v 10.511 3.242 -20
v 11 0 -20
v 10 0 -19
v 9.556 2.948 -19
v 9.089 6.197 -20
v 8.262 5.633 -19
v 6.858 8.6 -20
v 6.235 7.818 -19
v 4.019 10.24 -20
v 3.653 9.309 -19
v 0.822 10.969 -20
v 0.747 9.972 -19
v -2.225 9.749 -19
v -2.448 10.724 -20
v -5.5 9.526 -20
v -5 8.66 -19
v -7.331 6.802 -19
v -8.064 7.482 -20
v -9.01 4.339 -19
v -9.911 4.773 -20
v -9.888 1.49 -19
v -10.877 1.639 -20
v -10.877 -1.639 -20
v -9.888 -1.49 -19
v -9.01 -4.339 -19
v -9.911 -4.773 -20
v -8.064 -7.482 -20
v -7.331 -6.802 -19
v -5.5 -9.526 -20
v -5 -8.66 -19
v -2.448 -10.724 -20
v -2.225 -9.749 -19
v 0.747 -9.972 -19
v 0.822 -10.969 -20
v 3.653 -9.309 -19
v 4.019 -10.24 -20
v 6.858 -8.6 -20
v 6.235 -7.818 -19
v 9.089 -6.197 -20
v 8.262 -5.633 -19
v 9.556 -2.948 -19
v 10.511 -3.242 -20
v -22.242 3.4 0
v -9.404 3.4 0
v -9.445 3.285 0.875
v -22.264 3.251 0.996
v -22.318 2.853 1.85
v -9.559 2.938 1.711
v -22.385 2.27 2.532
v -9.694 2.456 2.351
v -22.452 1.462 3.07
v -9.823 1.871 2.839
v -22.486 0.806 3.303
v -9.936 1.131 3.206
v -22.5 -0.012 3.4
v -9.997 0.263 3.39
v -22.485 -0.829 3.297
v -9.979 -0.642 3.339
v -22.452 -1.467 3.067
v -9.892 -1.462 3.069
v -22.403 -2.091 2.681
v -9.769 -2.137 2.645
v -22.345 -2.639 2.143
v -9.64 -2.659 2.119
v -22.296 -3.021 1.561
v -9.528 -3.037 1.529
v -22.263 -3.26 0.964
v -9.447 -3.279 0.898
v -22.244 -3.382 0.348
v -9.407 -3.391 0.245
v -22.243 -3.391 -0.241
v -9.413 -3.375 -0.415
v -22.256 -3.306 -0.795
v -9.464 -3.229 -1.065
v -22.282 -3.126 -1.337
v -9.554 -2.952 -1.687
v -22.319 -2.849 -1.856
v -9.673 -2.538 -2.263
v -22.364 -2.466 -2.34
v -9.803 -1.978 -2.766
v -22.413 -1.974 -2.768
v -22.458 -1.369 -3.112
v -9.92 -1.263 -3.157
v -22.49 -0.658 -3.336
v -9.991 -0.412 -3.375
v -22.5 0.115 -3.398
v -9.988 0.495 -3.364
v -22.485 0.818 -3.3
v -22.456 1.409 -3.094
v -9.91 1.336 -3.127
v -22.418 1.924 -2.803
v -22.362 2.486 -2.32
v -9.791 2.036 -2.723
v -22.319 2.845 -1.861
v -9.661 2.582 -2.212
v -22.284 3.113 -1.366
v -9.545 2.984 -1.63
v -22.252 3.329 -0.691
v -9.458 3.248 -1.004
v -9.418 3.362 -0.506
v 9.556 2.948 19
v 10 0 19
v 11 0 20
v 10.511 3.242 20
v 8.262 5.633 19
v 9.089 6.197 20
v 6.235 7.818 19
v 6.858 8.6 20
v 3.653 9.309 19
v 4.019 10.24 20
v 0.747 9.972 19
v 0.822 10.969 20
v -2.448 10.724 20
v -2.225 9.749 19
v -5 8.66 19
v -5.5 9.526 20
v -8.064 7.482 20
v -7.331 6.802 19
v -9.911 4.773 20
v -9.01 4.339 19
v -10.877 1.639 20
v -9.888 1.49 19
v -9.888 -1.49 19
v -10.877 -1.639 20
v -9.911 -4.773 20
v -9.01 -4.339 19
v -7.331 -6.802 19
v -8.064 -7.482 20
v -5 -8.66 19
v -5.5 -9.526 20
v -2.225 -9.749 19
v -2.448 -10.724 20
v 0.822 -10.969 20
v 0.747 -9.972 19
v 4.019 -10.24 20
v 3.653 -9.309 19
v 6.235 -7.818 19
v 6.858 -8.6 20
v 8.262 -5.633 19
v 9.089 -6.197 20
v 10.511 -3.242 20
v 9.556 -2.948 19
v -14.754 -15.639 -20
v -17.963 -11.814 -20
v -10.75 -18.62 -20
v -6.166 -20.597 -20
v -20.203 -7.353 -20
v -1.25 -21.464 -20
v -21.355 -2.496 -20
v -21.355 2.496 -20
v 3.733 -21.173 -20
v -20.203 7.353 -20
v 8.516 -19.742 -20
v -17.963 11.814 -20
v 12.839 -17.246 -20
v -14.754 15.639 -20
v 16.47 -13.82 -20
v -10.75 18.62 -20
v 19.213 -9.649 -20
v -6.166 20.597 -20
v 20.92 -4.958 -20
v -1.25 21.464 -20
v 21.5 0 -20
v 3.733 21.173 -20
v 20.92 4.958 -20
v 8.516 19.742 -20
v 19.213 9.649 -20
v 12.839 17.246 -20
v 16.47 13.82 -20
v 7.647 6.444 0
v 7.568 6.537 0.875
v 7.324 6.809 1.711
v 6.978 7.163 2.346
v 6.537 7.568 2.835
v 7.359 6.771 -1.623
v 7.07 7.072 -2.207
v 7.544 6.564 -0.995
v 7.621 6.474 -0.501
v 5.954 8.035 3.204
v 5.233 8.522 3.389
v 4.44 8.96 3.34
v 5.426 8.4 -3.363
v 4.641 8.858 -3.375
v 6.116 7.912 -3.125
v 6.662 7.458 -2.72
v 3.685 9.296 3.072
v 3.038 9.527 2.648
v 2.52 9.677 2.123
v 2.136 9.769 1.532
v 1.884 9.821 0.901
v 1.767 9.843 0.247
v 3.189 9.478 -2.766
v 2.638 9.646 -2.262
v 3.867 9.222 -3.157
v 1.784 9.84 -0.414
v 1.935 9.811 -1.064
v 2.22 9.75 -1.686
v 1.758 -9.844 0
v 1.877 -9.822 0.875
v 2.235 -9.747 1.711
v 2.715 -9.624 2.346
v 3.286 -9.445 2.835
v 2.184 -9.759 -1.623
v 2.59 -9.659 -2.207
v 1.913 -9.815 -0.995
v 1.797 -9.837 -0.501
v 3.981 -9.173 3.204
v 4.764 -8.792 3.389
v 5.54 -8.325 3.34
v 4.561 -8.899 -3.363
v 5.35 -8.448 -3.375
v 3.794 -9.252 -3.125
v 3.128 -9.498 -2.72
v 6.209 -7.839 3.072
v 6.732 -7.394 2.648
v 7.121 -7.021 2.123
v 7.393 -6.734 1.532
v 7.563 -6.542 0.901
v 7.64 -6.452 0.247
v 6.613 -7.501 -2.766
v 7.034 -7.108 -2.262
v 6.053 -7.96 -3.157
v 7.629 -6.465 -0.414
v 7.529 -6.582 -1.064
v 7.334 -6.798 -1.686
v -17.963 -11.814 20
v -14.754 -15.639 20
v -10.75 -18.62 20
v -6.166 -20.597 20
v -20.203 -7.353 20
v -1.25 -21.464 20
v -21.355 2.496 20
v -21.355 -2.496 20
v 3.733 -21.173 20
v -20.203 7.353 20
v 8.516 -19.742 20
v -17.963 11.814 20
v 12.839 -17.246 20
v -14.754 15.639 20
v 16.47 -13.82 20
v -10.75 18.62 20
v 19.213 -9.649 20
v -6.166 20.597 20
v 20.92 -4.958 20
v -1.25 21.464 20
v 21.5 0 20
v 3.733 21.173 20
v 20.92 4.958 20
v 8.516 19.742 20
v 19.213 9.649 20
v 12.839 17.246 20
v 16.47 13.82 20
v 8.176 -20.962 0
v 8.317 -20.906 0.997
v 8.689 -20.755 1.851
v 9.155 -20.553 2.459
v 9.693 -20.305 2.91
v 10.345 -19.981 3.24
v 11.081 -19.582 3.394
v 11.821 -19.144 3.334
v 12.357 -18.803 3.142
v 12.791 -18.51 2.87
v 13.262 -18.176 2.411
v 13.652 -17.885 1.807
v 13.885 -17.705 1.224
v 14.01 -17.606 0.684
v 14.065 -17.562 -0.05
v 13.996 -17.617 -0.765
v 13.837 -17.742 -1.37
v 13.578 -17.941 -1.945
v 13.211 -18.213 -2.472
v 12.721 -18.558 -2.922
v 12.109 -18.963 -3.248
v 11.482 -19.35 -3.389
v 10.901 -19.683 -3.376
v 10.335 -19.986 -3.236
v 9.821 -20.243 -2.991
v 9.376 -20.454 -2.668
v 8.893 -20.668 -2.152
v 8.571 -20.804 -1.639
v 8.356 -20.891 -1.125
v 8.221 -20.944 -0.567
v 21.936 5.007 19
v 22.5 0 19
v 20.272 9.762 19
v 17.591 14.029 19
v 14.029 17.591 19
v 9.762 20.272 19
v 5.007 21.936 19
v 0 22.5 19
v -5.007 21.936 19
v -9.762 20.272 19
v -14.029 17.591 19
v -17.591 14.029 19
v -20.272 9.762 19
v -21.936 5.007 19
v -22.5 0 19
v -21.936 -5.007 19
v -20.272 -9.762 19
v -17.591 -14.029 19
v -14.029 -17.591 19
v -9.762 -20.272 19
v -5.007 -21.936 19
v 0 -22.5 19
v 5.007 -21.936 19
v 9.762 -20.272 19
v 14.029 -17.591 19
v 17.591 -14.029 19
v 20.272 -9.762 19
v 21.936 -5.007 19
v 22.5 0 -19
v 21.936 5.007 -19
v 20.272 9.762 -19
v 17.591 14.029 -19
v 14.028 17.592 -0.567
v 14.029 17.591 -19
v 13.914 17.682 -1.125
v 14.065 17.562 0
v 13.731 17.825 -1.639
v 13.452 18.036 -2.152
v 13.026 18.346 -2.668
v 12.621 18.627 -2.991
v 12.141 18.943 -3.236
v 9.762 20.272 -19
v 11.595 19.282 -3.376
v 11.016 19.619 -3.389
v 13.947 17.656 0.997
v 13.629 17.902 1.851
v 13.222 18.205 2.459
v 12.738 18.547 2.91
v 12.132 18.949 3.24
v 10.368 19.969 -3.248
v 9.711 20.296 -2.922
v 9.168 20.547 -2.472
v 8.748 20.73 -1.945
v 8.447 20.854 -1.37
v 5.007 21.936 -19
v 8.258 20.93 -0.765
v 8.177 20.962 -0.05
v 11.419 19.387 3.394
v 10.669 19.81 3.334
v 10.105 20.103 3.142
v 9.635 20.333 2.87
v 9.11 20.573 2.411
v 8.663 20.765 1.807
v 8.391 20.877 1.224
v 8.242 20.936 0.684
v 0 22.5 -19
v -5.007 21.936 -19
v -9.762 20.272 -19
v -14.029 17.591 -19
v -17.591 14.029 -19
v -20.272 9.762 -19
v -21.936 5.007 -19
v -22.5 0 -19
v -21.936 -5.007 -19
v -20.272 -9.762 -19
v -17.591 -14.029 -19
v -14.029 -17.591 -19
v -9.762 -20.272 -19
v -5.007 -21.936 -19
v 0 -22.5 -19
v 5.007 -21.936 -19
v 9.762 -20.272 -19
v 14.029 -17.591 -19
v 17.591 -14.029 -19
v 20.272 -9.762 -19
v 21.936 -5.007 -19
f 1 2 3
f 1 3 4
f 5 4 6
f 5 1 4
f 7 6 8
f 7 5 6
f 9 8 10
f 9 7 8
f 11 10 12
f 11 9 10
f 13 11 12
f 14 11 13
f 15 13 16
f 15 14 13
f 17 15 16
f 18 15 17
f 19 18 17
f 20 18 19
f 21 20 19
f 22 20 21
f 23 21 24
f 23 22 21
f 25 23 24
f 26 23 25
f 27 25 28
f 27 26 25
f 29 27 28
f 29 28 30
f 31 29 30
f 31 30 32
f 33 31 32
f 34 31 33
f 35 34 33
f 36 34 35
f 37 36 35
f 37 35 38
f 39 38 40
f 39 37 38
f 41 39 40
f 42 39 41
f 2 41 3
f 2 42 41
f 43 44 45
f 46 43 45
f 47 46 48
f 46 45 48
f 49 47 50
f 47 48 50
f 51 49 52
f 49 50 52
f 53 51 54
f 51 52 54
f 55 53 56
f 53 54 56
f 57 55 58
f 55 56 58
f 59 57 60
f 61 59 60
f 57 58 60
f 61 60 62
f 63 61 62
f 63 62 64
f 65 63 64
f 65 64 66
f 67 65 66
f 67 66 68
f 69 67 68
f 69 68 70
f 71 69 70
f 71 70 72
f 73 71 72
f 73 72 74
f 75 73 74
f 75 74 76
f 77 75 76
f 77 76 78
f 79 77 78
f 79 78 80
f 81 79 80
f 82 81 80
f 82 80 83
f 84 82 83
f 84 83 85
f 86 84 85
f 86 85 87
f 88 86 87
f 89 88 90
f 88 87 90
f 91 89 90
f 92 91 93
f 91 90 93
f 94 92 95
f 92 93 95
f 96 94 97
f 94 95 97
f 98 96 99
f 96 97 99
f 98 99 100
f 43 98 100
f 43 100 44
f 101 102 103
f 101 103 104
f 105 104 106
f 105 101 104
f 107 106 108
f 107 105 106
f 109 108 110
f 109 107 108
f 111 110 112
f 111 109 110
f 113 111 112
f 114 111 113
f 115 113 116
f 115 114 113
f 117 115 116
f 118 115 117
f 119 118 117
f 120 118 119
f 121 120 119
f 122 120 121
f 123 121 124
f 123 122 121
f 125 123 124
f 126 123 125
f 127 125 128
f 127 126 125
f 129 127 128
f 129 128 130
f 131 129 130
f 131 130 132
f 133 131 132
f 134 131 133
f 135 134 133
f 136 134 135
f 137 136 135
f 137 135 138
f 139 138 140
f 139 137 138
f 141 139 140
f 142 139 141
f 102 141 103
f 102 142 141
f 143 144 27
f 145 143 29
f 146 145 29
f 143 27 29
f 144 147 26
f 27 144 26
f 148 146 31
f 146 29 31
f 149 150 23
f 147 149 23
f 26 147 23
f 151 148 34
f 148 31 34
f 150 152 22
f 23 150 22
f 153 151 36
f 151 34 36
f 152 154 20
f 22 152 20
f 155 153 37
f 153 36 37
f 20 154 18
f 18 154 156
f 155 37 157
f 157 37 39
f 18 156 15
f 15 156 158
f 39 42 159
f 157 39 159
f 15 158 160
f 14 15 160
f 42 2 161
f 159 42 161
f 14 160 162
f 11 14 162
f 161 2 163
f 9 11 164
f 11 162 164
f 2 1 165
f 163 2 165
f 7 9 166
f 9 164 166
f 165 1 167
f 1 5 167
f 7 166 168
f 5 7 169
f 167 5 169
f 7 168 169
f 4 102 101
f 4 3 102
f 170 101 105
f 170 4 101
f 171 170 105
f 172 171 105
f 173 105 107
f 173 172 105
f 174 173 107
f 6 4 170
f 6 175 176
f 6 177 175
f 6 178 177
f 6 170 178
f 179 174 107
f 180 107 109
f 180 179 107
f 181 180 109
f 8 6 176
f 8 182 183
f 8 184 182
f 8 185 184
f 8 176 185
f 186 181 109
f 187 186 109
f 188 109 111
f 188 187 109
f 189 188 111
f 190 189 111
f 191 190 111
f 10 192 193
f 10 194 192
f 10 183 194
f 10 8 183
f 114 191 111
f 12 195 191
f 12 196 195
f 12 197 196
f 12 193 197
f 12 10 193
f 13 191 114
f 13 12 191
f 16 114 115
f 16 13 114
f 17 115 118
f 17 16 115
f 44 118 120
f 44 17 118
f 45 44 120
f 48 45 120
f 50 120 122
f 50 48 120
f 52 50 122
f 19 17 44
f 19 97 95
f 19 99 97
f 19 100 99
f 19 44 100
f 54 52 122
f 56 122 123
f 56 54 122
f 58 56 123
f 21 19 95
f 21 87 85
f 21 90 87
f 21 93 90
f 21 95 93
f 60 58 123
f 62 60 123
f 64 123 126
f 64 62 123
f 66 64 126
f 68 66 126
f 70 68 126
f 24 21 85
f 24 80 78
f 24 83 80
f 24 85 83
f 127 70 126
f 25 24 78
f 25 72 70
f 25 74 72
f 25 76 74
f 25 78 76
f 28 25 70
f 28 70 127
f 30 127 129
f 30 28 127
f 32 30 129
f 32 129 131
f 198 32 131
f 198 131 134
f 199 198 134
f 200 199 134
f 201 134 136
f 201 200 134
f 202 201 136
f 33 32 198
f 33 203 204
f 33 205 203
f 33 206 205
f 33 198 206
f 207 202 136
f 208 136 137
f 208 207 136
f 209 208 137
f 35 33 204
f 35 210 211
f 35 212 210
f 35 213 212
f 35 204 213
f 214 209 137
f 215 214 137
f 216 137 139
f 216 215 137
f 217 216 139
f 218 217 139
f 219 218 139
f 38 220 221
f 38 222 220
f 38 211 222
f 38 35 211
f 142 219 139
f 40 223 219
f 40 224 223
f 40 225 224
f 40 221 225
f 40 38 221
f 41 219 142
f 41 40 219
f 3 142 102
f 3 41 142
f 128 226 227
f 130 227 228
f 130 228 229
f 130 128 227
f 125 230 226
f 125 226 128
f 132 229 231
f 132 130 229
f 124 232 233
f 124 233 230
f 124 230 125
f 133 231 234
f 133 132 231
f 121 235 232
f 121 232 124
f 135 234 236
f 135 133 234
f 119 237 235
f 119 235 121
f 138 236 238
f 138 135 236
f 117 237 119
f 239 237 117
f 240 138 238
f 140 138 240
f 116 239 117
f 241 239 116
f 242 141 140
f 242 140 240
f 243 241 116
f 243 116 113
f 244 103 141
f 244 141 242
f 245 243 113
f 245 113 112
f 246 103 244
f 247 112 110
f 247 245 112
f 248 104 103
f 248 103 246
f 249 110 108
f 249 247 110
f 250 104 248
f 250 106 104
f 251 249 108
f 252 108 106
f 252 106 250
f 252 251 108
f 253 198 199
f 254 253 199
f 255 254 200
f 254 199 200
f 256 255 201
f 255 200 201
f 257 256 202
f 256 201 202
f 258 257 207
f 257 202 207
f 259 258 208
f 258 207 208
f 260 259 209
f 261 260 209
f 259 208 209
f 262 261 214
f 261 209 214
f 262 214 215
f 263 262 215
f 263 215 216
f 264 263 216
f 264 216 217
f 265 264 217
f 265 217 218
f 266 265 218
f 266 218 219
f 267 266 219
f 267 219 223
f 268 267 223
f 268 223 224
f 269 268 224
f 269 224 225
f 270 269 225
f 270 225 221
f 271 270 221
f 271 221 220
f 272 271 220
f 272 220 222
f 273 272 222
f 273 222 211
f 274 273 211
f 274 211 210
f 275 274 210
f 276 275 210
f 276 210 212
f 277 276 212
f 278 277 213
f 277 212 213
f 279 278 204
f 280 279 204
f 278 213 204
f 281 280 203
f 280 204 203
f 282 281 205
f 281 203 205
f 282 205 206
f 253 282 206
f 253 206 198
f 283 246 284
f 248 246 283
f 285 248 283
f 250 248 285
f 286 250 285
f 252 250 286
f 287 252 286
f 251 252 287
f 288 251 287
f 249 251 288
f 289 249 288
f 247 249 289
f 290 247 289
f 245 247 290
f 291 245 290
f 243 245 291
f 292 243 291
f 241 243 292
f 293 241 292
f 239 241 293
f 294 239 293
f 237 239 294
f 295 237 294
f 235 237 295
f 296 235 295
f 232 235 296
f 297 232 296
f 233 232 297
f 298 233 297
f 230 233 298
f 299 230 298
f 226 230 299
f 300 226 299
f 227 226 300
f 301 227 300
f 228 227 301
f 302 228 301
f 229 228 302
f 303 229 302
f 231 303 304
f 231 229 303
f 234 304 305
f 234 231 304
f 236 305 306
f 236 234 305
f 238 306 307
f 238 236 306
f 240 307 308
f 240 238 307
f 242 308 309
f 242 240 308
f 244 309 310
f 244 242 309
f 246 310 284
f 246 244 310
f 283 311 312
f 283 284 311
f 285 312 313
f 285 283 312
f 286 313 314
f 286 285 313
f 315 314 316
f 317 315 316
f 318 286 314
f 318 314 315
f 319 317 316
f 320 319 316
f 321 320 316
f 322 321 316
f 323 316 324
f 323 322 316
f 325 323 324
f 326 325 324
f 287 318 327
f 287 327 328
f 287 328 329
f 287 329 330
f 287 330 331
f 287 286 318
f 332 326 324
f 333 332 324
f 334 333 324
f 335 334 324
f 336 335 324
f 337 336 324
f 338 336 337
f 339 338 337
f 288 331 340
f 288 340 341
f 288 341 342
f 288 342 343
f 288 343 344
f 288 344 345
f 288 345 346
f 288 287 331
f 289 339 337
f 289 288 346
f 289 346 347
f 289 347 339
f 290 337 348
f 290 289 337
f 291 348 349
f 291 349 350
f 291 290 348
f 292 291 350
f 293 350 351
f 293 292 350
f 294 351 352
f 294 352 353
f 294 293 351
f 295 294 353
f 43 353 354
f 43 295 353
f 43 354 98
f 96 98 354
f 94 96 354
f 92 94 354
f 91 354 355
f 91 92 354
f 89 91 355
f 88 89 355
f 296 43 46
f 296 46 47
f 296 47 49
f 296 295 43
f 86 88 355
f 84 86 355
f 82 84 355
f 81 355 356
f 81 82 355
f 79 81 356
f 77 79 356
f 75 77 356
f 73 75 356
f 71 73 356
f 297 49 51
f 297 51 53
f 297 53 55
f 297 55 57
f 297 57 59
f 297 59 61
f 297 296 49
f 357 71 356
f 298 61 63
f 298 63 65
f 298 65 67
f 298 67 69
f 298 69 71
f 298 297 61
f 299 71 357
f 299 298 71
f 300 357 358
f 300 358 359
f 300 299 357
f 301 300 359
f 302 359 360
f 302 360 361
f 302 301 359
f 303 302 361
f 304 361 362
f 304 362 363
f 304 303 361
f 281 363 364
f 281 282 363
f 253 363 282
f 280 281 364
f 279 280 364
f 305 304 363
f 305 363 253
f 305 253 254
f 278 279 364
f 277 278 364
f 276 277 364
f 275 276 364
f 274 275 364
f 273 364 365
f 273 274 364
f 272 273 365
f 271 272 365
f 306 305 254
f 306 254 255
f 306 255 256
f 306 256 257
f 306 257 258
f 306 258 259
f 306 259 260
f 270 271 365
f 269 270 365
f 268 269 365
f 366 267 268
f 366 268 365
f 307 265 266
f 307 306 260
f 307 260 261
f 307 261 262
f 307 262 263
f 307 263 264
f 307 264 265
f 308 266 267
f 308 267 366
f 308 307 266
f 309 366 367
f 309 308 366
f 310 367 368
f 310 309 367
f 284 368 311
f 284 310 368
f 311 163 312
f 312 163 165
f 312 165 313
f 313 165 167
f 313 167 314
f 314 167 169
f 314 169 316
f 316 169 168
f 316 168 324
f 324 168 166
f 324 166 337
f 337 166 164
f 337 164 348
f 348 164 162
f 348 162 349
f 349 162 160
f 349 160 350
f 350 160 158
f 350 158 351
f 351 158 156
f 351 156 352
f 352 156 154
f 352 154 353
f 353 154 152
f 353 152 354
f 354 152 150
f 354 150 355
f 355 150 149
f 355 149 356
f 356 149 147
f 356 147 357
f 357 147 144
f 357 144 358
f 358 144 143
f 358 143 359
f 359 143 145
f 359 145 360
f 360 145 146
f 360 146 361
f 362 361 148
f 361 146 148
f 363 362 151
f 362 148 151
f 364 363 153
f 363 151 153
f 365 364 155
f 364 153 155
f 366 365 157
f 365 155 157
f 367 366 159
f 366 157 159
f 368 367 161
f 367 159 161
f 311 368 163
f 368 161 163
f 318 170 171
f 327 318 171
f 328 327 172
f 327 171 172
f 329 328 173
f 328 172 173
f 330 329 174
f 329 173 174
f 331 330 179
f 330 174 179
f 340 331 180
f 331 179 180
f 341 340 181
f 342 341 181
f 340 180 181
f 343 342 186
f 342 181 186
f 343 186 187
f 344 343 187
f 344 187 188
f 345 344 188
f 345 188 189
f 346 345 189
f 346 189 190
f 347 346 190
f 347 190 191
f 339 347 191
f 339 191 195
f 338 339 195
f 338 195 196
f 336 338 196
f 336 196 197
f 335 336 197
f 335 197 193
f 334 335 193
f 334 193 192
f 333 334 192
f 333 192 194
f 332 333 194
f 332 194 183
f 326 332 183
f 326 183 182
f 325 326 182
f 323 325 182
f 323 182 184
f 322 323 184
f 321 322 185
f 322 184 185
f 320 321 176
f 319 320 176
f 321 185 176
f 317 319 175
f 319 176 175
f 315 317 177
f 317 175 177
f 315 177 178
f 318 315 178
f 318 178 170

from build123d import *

# Parameters (mm, degrees)
F0_R            = 22.5
F0_R_2          = 10
F1_DEPTH        = 20
F2_SIZE         = 1
F10_D           = 6.8
F10_DEPTH       = 15
F10_TIP         = 2.0429261047
F10_ON_F7_D     = 6.8
F10_ON_F7_DEPTH = 15
F10_ON_F7_TIP   = 2.0429261047
F10_ON_F9_D     = 6.8
F10_ON_F9_DEPTH = 15
F10_ON_F9_TIP   = 2.0429261047


with BuildPart() as f1:
    # F0 (on Top) → F1 (new body, symmetric)
    with BuildSketch(Plane.XY):
        Circle(F0_R)
        Circle(F0_R_2, mode=Mode.SUBTRACT)
    extrude(amount=F1_DEPTH, both=True)

    # F2
    f2_edges = [f1.edges().sort_by_distance(p)[0] for p in [
        (-22.5, 0, 20),
        (-22.5, 0, -20),
        (-10, 0, 20),
        (-10, 0, -20),
    ]]
    chamfer(f2_edges, length=F2_SIZE)

    # F10
    with Locations(Plane(origin=(11.25, -19.4855715851, 0), x_dir=(0.8660254038, 0.5, 0), z_dir=(0.5, -0.8660254038, 0))):
        with Locations((0, 0)):
            Hole(F10_D / 2, depth=F10_DEPTH)
            with Locations((0, 0, -(F10_DEPTH + F10_TIP / 2))):  # 118° drill point
                Cone(0, F10_D / 2, F10_TIP, mode=Mode.SUBTRACT)

    # F10 on F7
    with Locations(Plane(origin=(11.3809796361, 19.7124349697, 0), x_dir=(-0.8660254038, 0.5, 0), z_dir=(0.5, 0.8660254038, 0))):
        with Locations((0, 0)):
            Hole(F10_ON_F7_D / 2, depth=F10_ON_F7_DEPTH)
            with Locations((0, 0, -(F10_ON_F7_DEPTH + F10_ON_F7_TIP / 2))):  # 118° drill point
                Cone(0, F10_ON_F7_D / 2, F10_ON_F7_TIP, mode=Mode.SUBTRACT)

    # F10 on F9
    with Locations(Plane(origin=(-22.5, 0, 0), x_dir=(0, -1, 0), z_dir=(-1, 0, 0))):
        with Locations((0, 0)):
            Hole(F10_ON_F9_D / 2, depth=F10_ON_F9_DEPTH)
            with Locations((0, 0, -(F10_ON_F9_DEPTH + F10_ON_F9_TIP / 2))):  # 118° drill point
                Cone(0, F10_ON_F9_D / 2, F10_ON_F9_TIP, mode=Mode.SUBTRACT)


solid = f1.part
